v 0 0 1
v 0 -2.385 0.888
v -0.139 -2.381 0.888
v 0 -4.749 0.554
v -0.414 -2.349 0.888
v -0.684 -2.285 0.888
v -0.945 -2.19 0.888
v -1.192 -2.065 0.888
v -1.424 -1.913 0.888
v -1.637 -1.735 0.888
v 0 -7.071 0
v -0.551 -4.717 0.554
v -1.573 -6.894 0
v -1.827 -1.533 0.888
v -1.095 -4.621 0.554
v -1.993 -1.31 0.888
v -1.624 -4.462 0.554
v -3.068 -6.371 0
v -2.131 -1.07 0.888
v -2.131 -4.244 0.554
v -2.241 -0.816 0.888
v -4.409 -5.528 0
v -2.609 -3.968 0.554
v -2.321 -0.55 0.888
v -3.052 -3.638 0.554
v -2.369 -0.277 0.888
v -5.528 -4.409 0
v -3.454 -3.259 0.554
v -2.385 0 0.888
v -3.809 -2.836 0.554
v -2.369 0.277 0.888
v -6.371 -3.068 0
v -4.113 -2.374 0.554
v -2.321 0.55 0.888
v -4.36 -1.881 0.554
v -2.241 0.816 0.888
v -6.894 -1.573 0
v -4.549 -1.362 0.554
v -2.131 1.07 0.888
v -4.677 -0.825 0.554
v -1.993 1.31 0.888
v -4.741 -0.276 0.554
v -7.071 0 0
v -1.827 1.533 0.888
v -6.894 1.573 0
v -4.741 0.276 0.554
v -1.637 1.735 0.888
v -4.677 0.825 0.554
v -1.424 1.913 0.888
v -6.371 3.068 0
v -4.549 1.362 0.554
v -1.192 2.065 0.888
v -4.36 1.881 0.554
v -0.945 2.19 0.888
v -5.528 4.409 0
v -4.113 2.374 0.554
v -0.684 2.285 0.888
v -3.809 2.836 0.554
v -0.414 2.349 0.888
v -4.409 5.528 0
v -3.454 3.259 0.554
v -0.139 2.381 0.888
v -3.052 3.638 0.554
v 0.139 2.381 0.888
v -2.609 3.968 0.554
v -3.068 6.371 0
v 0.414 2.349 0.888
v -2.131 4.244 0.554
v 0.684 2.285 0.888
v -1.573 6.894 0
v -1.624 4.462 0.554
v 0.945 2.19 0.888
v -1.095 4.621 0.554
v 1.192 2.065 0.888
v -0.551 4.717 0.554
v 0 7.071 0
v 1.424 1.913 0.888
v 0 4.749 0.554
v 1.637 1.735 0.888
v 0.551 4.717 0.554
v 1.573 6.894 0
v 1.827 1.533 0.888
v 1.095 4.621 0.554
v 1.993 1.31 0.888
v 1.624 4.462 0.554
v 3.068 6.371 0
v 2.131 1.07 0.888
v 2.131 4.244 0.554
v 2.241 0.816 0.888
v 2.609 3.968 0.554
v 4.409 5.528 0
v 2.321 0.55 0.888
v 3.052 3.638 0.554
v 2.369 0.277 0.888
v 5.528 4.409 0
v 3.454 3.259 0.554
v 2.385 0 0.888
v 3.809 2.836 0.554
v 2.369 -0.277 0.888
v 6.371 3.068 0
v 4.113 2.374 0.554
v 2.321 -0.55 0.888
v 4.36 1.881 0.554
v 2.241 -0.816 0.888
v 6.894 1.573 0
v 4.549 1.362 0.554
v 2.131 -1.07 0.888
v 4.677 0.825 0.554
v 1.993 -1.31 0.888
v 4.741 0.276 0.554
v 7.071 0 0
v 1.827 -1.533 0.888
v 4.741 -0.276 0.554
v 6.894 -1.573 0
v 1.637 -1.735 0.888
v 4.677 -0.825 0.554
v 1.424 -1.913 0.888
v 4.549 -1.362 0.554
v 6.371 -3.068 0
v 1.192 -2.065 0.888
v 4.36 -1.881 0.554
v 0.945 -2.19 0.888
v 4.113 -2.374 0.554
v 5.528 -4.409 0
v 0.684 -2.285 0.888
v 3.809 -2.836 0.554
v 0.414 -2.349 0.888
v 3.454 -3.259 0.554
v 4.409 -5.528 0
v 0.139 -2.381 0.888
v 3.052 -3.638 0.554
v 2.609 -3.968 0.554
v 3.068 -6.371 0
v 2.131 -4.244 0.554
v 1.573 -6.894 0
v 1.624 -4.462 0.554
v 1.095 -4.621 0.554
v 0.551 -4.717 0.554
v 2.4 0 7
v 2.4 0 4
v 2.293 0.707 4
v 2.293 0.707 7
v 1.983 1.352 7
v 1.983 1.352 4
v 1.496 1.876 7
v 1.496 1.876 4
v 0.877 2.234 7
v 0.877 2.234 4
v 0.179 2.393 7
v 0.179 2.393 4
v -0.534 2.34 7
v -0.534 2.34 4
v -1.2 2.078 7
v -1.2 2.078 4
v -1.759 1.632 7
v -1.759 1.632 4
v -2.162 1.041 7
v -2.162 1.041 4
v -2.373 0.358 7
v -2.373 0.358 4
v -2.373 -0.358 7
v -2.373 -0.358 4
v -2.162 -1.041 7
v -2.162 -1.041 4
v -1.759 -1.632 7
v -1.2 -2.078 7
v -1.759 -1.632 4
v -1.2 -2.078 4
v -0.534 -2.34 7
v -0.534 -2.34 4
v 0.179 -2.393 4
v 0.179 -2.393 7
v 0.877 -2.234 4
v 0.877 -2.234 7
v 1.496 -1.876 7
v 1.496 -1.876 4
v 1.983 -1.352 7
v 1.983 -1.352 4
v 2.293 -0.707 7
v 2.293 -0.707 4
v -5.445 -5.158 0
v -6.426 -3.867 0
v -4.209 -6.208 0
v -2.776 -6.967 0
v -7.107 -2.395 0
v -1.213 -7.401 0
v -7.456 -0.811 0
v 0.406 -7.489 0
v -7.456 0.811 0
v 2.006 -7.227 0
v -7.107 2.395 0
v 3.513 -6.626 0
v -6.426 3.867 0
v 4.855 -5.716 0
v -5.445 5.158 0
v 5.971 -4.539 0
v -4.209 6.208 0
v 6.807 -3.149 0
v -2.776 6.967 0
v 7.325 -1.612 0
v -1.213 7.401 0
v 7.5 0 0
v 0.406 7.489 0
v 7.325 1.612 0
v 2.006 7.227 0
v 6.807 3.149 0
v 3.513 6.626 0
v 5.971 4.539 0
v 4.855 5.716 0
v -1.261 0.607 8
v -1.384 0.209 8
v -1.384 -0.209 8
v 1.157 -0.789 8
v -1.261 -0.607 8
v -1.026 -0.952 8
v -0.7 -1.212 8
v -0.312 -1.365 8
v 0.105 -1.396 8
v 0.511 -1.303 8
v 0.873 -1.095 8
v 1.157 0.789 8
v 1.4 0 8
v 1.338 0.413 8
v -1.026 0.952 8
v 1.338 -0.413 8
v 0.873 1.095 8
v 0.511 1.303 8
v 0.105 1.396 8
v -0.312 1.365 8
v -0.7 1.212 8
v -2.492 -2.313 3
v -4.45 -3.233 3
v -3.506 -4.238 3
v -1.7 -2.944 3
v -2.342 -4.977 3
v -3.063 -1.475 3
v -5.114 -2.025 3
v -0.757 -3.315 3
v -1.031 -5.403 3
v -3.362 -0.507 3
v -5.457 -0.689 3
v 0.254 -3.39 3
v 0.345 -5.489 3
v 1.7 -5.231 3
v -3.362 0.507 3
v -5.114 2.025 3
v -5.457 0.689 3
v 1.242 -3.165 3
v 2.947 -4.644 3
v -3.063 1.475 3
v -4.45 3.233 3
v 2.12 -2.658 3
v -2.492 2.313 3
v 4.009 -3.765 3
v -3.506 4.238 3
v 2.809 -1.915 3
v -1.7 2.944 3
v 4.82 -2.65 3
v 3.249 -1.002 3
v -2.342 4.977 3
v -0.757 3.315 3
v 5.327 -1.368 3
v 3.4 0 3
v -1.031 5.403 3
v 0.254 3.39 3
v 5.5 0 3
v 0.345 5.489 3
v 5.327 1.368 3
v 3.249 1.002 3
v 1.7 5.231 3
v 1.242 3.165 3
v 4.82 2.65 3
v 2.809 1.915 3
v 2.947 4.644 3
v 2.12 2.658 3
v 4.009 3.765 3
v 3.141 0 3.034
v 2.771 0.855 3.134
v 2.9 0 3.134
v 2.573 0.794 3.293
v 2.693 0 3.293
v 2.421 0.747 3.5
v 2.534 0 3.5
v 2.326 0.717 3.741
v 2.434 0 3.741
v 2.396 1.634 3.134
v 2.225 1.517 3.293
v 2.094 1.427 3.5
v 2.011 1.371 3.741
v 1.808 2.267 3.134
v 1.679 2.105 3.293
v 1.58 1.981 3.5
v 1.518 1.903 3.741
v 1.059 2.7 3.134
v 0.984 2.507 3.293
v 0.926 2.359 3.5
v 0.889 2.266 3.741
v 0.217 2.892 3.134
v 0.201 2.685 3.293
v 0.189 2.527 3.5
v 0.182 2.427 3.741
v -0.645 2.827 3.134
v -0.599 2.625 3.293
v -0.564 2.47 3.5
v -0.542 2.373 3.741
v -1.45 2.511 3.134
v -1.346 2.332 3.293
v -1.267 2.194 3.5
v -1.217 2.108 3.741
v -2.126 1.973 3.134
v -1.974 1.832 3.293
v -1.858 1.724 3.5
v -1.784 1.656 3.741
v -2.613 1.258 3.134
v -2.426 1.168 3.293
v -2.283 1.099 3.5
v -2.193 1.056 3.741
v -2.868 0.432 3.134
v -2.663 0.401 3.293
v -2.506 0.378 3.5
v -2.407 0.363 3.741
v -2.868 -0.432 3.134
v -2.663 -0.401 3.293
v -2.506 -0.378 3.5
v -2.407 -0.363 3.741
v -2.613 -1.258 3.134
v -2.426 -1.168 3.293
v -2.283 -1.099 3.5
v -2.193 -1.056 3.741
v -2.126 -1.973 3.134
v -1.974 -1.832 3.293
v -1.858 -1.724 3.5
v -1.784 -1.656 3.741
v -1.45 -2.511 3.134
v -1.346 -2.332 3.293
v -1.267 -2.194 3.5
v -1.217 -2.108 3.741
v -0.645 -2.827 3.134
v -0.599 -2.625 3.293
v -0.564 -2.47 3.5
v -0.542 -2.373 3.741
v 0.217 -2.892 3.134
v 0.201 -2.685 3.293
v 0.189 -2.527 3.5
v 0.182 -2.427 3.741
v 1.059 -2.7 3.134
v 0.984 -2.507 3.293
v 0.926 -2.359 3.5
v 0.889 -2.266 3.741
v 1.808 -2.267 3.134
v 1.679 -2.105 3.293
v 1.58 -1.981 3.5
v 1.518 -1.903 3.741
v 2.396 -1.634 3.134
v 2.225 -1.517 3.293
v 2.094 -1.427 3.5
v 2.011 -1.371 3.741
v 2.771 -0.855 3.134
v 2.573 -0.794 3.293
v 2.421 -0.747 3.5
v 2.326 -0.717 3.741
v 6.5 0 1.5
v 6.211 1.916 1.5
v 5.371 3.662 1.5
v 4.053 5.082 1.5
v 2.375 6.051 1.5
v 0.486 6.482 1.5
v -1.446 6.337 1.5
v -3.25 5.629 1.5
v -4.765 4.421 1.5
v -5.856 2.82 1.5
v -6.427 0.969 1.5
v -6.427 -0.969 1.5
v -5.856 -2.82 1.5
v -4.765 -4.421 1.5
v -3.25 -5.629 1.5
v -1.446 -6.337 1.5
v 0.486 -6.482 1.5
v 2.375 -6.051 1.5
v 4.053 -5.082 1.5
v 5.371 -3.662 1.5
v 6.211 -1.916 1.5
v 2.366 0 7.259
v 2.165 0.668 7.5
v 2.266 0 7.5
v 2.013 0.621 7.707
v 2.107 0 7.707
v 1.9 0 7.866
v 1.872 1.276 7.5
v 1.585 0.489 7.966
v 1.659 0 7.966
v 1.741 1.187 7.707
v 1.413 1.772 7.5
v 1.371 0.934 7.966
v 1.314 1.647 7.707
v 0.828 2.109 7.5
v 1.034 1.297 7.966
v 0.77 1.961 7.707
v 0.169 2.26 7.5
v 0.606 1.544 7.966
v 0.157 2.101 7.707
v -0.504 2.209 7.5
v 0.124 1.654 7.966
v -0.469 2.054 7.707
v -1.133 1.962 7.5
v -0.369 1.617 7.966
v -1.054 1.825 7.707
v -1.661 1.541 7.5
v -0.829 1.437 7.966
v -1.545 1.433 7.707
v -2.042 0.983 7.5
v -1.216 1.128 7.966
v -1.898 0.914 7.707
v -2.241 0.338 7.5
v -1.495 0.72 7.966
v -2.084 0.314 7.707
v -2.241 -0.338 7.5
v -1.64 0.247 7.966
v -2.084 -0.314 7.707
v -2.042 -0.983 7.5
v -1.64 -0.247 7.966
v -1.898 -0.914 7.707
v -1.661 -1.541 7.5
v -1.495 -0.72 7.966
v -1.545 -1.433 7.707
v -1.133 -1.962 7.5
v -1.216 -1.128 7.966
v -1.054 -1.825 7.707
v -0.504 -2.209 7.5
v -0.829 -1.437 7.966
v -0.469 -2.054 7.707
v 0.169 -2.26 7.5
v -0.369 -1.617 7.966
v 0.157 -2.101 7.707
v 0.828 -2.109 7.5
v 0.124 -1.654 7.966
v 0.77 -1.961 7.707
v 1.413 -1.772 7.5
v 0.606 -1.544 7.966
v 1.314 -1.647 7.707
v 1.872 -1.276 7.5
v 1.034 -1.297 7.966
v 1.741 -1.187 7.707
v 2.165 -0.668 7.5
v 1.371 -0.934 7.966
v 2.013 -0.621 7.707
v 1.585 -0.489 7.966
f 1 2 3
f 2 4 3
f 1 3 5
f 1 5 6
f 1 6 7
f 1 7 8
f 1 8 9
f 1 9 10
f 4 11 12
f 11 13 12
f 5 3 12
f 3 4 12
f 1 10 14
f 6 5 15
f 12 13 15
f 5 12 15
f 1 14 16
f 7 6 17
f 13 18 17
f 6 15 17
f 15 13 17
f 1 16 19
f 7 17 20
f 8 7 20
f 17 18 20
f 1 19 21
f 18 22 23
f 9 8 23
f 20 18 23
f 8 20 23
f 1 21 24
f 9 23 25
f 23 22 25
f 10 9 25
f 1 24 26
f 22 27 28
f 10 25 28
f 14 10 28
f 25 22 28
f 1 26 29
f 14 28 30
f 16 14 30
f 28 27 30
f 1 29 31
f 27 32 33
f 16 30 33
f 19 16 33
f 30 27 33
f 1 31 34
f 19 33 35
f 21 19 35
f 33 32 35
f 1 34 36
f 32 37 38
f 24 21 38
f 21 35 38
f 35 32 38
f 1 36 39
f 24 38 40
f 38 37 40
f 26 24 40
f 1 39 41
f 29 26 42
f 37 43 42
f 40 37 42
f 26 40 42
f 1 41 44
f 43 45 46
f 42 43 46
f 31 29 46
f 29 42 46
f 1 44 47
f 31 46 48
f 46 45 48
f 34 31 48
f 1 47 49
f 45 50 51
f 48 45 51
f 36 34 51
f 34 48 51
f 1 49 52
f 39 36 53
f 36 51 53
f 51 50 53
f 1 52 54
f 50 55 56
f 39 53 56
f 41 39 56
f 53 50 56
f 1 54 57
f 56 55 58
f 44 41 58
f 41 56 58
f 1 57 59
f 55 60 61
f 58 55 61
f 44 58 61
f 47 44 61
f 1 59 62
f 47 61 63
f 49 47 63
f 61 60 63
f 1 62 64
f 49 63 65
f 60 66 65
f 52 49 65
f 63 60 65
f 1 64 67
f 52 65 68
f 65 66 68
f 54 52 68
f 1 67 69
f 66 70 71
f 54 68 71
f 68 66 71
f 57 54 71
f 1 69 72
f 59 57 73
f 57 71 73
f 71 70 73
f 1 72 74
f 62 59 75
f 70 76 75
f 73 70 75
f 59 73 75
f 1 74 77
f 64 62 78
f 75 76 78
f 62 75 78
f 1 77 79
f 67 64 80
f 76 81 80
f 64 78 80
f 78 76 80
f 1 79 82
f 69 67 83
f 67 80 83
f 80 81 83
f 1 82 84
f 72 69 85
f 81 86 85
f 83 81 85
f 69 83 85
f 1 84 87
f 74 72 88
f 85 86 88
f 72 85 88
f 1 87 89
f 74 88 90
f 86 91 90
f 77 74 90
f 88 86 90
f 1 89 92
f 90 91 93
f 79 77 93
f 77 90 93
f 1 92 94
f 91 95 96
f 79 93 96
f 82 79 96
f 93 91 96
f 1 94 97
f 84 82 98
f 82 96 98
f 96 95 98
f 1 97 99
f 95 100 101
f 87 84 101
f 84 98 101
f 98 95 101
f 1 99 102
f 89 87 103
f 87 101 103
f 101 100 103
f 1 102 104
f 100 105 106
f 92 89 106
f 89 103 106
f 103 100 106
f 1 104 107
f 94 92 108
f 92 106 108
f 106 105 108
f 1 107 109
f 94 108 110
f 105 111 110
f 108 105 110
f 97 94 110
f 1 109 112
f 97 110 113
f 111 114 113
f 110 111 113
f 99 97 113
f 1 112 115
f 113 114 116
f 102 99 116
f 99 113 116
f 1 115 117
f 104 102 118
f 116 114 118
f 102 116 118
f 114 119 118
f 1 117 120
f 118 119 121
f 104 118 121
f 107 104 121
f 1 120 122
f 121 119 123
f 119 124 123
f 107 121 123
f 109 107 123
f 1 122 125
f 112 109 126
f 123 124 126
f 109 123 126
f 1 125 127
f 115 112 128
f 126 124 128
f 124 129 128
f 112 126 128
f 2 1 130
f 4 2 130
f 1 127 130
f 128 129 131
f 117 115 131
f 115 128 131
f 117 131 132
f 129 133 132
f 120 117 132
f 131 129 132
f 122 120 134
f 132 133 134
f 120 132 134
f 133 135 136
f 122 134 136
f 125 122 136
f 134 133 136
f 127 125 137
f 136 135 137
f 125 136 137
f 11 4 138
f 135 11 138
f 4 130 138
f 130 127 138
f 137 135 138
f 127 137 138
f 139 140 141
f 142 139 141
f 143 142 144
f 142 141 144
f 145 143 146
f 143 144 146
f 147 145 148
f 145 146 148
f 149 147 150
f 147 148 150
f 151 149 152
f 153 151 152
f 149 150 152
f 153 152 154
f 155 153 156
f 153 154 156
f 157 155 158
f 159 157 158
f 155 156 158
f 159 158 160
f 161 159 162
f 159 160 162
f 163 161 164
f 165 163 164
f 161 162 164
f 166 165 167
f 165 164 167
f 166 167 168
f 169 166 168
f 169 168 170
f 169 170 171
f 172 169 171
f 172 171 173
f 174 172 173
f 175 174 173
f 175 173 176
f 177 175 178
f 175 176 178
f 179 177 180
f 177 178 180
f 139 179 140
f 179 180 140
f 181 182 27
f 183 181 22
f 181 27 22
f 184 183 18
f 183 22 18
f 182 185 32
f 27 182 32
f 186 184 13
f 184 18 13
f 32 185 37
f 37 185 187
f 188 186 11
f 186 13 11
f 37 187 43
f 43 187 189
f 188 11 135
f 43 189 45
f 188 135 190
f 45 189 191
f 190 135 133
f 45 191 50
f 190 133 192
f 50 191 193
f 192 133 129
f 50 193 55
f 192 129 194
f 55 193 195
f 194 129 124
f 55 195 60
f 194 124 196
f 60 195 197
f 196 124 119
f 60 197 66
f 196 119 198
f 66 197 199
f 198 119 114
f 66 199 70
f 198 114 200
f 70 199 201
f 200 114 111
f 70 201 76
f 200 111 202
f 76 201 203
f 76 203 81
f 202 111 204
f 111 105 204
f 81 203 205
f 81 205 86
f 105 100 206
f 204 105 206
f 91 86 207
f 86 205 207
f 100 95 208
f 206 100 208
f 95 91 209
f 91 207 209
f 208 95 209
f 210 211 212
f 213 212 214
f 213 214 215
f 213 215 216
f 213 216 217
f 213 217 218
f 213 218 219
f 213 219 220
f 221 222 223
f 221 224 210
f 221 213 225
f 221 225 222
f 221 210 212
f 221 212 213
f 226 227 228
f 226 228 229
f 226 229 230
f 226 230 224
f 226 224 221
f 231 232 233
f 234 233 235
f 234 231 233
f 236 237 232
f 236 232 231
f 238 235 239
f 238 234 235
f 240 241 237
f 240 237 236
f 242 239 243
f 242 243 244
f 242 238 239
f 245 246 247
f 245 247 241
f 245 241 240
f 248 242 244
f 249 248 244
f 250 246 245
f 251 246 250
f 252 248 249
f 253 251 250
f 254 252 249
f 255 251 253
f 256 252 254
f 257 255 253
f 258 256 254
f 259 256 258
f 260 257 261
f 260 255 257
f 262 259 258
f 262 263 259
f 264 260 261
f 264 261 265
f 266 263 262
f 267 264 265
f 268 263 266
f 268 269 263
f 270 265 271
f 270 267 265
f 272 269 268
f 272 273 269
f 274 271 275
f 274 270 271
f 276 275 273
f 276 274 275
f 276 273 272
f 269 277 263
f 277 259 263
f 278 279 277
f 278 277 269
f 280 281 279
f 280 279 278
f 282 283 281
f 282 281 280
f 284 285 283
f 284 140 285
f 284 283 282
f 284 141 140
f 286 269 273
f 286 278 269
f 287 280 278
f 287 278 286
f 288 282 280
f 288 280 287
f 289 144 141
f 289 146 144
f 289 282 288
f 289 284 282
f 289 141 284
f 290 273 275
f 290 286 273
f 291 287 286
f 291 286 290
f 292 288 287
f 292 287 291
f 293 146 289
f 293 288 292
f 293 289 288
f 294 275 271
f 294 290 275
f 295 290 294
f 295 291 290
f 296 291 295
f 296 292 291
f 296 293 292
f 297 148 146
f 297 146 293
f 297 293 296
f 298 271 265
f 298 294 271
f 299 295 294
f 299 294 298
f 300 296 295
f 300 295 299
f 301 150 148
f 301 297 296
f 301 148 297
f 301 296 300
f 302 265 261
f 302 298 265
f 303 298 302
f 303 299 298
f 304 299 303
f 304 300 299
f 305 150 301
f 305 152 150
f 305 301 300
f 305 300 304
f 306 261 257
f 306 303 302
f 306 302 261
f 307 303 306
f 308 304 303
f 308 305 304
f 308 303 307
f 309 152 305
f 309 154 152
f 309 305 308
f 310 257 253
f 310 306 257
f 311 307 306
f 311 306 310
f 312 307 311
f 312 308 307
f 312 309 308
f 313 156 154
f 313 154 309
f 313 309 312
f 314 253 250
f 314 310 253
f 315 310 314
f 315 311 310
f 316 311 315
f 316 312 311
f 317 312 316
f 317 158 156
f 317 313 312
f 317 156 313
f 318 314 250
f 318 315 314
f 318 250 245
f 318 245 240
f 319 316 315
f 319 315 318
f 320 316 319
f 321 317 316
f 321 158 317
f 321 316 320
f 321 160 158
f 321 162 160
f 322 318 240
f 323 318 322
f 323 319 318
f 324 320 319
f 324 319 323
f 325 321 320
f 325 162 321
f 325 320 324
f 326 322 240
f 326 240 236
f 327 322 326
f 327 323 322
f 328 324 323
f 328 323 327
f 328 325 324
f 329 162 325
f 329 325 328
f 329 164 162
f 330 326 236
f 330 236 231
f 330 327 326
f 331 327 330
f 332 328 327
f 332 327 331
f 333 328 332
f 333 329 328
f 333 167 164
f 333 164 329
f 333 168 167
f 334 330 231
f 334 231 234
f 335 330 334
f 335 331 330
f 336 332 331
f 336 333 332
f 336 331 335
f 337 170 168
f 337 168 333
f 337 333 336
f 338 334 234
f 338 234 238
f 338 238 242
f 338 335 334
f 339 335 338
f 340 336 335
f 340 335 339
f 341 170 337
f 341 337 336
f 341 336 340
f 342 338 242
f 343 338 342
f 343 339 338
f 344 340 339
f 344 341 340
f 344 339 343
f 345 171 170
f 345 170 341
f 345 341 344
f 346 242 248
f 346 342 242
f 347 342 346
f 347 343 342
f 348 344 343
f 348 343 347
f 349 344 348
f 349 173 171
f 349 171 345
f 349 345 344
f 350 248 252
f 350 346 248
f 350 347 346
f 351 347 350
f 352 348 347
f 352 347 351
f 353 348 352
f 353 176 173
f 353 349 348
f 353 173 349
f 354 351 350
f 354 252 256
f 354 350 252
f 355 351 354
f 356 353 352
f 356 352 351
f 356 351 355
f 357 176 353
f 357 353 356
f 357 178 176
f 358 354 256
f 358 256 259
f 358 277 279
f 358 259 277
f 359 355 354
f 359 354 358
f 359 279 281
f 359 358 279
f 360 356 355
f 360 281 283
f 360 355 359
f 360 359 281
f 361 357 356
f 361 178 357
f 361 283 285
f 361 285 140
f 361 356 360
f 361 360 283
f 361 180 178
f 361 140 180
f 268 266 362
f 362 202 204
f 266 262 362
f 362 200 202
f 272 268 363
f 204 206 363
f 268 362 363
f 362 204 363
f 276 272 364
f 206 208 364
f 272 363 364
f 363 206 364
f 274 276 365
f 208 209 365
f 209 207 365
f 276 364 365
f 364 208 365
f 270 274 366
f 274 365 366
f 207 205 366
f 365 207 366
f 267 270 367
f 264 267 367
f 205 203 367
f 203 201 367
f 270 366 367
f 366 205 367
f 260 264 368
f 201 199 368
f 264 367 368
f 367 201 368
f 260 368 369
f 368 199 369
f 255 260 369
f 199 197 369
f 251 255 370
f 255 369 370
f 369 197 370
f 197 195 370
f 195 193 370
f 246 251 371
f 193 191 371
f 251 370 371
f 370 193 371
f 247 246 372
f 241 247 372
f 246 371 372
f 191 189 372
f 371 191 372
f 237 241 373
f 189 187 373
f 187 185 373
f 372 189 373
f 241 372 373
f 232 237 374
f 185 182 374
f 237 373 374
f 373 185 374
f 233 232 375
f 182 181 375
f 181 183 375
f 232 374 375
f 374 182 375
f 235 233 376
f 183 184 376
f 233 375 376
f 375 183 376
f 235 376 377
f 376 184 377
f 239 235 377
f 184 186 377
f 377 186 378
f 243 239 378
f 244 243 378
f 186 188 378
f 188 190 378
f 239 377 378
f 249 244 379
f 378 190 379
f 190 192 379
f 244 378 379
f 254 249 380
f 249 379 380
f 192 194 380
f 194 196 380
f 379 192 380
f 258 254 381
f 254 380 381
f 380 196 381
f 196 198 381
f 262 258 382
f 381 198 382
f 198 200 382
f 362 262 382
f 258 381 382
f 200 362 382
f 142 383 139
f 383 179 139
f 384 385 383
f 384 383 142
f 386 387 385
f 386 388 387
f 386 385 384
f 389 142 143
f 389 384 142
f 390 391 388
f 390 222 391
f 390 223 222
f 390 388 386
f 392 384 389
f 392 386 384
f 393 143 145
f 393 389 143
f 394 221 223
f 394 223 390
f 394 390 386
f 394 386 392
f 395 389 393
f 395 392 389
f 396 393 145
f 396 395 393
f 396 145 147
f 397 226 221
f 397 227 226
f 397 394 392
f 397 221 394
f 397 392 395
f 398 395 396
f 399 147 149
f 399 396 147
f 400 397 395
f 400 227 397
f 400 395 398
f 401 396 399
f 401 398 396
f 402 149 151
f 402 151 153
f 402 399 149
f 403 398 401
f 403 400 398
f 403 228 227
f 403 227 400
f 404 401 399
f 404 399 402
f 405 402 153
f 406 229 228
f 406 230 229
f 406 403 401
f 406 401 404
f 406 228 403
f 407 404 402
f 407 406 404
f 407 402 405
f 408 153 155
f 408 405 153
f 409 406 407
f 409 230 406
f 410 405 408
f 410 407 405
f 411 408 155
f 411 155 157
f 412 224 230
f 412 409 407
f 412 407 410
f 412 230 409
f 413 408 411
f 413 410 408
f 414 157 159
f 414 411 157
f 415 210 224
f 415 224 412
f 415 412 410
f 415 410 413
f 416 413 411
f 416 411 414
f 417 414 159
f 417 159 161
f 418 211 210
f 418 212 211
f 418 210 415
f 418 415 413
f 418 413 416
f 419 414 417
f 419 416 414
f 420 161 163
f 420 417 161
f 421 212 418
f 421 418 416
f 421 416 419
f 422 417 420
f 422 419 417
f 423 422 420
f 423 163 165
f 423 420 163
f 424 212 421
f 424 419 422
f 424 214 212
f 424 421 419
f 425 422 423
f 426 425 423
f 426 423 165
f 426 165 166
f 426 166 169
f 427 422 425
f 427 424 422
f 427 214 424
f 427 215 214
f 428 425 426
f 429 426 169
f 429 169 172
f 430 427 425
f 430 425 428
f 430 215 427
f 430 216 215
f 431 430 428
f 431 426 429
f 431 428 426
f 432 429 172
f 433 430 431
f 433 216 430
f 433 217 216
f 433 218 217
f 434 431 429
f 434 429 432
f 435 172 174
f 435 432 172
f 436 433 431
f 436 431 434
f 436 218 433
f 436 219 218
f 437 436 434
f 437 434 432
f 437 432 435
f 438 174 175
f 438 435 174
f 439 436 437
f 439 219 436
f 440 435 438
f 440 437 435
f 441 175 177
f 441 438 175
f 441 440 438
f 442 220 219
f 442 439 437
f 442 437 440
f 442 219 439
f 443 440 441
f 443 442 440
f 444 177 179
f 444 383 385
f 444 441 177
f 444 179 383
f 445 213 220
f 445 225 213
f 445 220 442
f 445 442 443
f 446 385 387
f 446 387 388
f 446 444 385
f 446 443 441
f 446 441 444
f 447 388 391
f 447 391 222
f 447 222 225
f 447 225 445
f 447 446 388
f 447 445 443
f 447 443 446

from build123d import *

# Parameters (mm, degrees)
F0_R     = 7.5
F1_DEPTH = 3
F2_SIZE2 = 2.99999
F2_SIZE  = 1.99999
F3_R     = 2.4
F4_DEPTH = 5
F5_R     = 1


# Not quite as in the source:
# - a fillet or chamfer is up to 0.001 mm smaller than in the source, because OpenCascade refuses the exact size


with BuildPart() as f1:
    # F0 (on Top) → F1 (new body)
    with BuildSketch(Plane.XY):
        Circle(F0_R)
    extrude(amount=F1_DEPTH)

    # F2 (size 2 and 3 in the source; OpenCascade refuses exactly that, so slightly less here)
    f2_edges = [f1.edges().sort_by_distance(p)[0] for p in [
        (-7.5, 0, 3),
    ]]
    f2_side = f1.faces().sort_by_distance((0, 0, 3))[0]
    chamfer(f2_edges, length=F2_SIZE, length2=F2_SIZE2, reference=f2_side)

    # F3 (on face) → F4 (join)
    with BuildSketch(Plane.XY.offset(3)):
        Circle(F3_R)
    extrude(amount=F4_DEPTH)

    # F5
    f5_edges = [f1.edges().sort_by_distance(p)[0] for p in [
        (-2.4, 0, 8),
        (-2.4, 0, 3),
    ]]
    fillet(f5_edges, radius=F5_R)

    # F6 (on Right) → F7 (revolve, cut)
    with BuildSketch(Plane.YZ):
        with BuildLine():
            Line((0, 0), (0, 1))
            ThreePointArc((0, 1), (-18.0312229203, -6.4687770797), (-25.5, -24.5))
            Line((-25.5, -24.5), (0, -24.5))
            Line((0, -24.5), (0, 0))
        make_face()
    revolve(axis=Axis((0, 0, -12.25), (0, 0, -1)), mode=Mode.SUBTRACT)


solid = f1.part
